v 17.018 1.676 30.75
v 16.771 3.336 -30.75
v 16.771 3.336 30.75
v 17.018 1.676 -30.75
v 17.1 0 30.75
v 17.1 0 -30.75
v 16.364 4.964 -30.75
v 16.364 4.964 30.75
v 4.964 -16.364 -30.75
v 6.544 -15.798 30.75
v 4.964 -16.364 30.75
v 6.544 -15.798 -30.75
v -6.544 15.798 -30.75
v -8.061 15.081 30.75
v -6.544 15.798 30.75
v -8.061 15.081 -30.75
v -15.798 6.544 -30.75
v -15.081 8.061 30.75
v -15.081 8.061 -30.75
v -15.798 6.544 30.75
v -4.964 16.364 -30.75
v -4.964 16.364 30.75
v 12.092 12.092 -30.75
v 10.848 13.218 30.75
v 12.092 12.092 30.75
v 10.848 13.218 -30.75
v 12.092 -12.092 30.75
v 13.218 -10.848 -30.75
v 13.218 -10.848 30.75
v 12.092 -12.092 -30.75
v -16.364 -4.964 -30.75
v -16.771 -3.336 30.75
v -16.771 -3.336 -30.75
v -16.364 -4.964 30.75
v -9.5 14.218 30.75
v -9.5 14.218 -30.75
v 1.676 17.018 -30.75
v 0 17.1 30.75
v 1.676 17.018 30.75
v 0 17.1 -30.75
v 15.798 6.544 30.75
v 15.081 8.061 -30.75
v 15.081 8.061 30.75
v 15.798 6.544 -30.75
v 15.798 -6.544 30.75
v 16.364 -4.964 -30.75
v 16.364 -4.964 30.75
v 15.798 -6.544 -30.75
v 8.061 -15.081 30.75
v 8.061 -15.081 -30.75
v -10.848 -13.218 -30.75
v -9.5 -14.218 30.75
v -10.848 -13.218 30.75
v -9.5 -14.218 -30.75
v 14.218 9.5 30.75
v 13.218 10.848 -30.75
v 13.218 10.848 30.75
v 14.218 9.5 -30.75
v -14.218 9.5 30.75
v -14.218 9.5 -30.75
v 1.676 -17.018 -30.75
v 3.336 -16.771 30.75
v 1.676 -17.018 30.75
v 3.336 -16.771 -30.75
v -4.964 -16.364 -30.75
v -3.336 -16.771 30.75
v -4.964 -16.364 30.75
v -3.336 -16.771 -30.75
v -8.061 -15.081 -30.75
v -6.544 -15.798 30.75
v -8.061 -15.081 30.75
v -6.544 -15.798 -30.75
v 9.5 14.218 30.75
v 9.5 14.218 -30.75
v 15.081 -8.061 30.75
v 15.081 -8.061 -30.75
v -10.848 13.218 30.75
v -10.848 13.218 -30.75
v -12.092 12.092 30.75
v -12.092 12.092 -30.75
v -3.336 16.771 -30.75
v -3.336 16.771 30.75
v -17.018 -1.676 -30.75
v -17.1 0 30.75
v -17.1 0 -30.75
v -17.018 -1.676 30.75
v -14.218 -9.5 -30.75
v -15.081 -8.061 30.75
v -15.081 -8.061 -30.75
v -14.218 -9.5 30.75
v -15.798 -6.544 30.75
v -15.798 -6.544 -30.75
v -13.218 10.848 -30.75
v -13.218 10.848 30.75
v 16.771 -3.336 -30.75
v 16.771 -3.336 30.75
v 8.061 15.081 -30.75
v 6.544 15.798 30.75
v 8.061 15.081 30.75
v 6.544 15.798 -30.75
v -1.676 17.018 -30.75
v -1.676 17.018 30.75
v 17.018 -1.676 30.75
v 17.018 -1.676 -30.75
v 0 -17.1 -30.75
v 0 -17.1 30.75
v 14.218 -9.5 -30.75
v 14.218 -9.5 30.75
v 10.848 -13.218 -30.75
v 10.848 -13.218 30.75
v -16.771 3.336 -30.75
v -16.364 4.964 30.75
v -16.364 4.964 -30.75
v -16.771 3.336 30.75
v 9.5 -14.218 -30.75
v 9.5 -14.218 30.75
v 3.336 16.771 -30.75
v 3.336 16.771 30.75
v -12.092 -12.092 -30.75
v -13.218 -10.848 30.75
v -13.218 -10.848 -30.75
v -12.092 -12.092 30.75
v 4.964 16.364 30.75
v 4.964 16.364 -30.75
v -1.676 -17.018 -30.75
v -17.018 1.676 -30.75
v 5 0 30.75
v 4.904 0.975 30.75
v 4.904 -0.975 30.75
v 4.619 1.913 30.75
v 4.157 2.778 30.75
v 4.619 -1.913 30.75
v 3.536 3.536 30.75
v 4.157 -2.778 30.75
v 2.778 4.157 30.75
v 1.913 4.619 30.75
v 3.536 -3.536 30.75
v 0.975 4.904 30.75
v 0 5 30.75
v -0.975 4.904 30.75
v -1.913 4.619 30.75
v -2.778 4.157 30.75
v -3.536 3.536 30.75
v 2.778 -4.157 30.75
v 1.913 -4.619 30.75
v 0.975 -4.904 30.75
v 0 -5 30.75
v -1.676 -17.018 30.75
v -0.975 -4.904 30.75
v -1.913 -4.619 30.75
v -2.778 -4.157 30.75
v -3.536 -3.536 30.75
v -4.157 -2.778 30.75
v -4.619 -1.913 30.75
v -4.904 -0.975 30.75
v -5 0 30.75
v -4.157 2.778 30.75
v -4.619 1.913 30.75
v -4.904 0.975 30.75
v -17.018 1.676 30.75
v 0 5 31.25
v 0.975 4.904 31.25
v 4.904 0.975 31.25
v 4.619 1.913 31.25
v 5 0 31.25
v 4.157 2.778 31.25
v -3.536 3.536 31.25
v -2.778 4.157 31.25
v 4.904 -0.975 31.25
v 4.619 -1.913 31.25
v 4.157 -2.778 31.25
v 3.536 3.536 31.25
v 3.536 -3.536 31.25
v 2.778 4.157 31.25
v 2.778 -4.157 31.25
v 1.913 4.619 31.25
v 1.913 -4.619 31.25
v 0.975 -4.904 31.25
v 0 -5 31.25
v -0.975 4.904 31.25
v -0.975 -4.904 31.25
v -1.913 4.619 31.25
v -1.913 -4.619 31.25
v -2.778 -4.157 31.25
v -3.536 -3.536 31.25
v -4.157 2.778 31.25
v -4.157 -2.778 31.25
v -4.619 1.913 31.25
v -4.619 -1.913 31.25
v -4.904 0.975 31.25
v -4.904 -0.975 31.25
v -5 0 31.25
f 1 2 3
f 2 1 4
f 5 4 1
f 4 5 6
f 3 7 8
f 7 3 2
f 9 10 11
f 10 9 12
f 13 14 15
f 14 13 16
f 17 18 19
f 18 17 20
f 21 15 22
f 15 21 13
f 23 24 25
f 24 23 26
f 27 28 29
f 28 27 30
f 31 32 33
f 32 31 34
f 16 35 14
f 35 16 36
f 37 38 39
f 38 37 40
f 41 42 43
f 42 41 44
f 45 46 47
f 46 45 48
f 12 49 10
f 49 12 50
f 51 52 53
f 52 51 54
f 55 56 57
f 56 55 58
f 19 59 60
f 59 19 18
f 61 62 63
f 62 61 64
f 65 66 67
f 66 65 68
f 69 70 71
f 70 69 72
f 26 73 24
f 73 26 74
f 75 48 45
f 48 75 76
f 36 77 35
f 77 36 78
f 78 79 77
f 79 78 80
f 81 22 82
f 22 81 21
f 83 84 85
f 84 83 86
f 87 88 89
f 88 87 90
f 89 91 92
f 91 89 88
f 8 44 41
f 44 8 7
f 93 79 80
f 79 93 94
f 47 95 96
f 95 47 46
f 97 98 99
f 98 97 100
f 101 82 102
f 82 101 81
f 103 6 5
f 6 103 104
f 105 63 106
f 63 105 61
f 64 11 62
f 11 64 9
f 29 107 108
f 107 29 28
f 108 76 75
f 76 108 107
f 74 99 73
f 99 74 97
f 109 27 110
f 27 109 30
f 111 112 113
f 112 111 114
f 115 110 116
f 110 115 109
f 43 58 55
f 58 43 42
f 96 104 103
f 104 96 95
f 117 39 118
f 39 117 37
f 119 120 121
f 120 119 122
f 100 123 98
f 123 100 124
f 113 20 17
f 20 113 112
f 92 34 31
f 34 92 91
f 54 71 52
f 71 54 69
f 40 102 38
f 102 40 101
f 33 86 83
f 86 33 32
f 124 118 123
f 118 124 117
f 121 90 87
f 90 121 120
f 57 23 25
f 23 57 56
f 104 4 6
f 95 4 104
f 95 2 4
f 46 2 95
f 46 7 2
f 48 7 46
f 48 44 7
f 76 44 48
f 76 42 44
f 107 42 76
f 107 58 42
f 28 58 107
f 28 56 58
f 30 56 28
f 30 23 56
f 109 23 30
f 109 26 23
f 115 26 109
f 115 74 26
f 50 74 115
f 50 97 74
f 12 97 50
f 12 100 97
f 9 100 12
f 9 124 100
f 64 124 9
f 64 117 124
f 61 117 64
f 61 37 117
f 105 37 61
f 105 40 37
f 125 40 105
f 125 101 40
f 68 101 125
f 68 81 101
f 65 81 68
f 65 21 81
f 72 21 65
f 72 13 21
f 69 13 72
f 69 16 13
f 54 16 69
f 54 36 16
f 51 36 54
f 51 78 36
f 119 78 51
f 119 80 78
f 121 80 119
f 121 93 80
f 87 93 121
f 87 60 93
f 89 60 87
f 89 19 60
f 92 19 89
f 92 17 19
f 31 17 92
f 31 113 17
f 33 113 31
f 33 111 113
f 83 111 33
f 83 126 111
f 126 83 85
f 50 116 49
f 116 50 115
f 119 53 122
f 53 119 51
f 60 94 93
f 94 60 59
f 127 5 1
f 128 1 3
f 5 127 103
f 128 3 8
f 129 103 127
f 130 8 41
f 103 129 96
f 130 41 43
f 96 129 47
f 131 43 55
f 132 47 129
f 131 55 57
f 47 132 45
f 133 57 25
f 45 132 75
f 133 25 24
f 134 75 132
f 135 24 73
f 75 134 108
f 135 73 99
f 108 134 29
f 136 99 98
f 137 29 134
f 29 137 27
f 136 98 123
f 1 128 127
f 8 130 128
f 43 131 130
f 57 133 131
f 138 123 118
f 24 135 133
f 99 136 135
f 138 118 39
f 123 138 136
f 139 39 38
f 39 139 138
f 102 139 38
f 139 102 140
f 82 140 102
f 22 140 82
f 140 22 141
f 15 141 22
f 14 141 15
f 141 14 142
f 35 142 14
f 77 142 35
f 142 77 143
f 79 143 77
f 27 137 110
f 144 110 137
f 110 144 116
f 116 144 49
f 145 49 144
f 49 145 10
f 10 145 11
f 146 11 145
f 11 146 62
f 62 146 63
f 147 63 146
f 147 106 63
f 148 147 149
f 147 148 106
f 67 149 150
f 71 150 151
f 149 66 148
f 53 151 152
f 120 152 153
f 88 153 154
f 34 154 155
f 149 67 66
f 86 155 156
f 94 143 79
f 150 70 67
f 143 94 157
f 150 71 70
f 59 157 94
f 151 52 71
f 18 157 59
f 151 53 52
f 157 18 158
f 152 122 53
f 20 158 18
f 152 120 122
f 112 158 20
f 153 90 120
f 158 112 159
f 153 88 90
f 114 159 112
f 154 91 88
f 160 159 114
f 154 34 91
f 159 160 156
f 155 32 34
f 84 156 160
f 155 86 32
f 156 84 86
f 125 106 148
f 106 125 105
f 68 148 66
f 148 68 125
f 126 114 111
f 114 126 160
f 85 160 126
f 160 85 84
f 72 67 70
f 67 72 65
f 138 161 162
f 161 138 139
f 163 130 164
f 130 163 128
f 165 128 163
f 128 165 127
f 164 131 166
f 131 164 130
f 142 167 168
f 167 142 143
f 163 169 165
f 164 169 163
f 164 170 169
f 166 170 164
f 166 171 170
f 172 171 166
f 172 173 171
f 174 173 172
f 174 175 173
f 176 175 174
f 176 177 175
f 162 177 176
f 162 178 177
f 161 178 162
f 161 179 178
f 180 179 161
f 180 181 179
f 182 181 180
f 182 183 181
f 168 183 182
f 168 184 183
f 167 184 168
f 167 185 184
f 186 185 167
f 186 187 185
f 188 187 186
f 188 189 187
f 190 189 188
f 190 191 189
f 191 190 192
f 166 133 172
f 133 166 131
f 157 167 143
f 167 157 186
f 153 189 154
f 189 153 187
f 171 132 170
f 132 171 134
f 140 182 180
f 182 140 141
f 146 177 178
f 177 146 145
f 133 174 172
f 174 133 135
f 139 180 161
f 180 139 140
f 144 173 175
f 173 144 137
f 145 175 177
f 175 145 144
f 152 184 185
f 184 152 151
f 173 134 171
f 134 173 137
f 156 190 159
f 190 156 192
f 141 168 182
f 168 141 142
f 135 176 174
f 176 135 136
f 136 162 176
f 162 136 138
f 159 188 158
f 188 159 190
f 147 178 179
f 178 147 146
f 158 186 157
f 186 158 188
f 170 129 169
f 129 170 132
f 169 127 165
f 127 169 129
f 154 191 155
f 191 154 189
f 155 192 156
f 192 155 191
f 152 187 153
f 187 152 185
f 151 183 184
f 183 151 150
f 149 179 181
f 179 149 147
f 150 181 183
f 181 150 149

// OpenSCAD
// Parameters
height_mm = 61.5; //[30.75:123:0.1]
diameter_mm = 34.2; //[17.1:68.4:0.1]
positive_terminal_diameter_mm = 10; //[5:20:0.1]
positive_terminal_height_mm = 1.5; //[0.75:3:0.1]
negative_terminal_diameter_mm = 12; //[6:24:0.1]
negative_terminal_height_mm = 0.5; //[0.25:1:0.05]
terminal_overlap_mm = 1; //[0.5:2:0.1]

// Battery - complete geometry
module battery() {
  color("DimGray") {
    // Main cell cylinder
    cylinder(h=height_mm, r=diameter_mm/2, center=true, $fn=64);
    
    // Positive terminal button
    translate([0, 0, height_mm/2 + positive_terminal_height_mm/2 - terminal_overlap_mm])
      cylinder(h=positive_terminal_height_mm, r=positive_terminal_diameter_mm/2, center=true, $fn=32);
    
    // Negative terminal contact
    translate([0, 0, -height_mm/2 - negative_terminal_height_mm/2 + terminal_overlap_mm])
      cylinder(h=negative_terminal_height_mm, r=negative_terminal_diameter_mm/2, center=true, $fn=32);
  }
}

// Assembly
module assembly() {
  battery();
}

assembly();
